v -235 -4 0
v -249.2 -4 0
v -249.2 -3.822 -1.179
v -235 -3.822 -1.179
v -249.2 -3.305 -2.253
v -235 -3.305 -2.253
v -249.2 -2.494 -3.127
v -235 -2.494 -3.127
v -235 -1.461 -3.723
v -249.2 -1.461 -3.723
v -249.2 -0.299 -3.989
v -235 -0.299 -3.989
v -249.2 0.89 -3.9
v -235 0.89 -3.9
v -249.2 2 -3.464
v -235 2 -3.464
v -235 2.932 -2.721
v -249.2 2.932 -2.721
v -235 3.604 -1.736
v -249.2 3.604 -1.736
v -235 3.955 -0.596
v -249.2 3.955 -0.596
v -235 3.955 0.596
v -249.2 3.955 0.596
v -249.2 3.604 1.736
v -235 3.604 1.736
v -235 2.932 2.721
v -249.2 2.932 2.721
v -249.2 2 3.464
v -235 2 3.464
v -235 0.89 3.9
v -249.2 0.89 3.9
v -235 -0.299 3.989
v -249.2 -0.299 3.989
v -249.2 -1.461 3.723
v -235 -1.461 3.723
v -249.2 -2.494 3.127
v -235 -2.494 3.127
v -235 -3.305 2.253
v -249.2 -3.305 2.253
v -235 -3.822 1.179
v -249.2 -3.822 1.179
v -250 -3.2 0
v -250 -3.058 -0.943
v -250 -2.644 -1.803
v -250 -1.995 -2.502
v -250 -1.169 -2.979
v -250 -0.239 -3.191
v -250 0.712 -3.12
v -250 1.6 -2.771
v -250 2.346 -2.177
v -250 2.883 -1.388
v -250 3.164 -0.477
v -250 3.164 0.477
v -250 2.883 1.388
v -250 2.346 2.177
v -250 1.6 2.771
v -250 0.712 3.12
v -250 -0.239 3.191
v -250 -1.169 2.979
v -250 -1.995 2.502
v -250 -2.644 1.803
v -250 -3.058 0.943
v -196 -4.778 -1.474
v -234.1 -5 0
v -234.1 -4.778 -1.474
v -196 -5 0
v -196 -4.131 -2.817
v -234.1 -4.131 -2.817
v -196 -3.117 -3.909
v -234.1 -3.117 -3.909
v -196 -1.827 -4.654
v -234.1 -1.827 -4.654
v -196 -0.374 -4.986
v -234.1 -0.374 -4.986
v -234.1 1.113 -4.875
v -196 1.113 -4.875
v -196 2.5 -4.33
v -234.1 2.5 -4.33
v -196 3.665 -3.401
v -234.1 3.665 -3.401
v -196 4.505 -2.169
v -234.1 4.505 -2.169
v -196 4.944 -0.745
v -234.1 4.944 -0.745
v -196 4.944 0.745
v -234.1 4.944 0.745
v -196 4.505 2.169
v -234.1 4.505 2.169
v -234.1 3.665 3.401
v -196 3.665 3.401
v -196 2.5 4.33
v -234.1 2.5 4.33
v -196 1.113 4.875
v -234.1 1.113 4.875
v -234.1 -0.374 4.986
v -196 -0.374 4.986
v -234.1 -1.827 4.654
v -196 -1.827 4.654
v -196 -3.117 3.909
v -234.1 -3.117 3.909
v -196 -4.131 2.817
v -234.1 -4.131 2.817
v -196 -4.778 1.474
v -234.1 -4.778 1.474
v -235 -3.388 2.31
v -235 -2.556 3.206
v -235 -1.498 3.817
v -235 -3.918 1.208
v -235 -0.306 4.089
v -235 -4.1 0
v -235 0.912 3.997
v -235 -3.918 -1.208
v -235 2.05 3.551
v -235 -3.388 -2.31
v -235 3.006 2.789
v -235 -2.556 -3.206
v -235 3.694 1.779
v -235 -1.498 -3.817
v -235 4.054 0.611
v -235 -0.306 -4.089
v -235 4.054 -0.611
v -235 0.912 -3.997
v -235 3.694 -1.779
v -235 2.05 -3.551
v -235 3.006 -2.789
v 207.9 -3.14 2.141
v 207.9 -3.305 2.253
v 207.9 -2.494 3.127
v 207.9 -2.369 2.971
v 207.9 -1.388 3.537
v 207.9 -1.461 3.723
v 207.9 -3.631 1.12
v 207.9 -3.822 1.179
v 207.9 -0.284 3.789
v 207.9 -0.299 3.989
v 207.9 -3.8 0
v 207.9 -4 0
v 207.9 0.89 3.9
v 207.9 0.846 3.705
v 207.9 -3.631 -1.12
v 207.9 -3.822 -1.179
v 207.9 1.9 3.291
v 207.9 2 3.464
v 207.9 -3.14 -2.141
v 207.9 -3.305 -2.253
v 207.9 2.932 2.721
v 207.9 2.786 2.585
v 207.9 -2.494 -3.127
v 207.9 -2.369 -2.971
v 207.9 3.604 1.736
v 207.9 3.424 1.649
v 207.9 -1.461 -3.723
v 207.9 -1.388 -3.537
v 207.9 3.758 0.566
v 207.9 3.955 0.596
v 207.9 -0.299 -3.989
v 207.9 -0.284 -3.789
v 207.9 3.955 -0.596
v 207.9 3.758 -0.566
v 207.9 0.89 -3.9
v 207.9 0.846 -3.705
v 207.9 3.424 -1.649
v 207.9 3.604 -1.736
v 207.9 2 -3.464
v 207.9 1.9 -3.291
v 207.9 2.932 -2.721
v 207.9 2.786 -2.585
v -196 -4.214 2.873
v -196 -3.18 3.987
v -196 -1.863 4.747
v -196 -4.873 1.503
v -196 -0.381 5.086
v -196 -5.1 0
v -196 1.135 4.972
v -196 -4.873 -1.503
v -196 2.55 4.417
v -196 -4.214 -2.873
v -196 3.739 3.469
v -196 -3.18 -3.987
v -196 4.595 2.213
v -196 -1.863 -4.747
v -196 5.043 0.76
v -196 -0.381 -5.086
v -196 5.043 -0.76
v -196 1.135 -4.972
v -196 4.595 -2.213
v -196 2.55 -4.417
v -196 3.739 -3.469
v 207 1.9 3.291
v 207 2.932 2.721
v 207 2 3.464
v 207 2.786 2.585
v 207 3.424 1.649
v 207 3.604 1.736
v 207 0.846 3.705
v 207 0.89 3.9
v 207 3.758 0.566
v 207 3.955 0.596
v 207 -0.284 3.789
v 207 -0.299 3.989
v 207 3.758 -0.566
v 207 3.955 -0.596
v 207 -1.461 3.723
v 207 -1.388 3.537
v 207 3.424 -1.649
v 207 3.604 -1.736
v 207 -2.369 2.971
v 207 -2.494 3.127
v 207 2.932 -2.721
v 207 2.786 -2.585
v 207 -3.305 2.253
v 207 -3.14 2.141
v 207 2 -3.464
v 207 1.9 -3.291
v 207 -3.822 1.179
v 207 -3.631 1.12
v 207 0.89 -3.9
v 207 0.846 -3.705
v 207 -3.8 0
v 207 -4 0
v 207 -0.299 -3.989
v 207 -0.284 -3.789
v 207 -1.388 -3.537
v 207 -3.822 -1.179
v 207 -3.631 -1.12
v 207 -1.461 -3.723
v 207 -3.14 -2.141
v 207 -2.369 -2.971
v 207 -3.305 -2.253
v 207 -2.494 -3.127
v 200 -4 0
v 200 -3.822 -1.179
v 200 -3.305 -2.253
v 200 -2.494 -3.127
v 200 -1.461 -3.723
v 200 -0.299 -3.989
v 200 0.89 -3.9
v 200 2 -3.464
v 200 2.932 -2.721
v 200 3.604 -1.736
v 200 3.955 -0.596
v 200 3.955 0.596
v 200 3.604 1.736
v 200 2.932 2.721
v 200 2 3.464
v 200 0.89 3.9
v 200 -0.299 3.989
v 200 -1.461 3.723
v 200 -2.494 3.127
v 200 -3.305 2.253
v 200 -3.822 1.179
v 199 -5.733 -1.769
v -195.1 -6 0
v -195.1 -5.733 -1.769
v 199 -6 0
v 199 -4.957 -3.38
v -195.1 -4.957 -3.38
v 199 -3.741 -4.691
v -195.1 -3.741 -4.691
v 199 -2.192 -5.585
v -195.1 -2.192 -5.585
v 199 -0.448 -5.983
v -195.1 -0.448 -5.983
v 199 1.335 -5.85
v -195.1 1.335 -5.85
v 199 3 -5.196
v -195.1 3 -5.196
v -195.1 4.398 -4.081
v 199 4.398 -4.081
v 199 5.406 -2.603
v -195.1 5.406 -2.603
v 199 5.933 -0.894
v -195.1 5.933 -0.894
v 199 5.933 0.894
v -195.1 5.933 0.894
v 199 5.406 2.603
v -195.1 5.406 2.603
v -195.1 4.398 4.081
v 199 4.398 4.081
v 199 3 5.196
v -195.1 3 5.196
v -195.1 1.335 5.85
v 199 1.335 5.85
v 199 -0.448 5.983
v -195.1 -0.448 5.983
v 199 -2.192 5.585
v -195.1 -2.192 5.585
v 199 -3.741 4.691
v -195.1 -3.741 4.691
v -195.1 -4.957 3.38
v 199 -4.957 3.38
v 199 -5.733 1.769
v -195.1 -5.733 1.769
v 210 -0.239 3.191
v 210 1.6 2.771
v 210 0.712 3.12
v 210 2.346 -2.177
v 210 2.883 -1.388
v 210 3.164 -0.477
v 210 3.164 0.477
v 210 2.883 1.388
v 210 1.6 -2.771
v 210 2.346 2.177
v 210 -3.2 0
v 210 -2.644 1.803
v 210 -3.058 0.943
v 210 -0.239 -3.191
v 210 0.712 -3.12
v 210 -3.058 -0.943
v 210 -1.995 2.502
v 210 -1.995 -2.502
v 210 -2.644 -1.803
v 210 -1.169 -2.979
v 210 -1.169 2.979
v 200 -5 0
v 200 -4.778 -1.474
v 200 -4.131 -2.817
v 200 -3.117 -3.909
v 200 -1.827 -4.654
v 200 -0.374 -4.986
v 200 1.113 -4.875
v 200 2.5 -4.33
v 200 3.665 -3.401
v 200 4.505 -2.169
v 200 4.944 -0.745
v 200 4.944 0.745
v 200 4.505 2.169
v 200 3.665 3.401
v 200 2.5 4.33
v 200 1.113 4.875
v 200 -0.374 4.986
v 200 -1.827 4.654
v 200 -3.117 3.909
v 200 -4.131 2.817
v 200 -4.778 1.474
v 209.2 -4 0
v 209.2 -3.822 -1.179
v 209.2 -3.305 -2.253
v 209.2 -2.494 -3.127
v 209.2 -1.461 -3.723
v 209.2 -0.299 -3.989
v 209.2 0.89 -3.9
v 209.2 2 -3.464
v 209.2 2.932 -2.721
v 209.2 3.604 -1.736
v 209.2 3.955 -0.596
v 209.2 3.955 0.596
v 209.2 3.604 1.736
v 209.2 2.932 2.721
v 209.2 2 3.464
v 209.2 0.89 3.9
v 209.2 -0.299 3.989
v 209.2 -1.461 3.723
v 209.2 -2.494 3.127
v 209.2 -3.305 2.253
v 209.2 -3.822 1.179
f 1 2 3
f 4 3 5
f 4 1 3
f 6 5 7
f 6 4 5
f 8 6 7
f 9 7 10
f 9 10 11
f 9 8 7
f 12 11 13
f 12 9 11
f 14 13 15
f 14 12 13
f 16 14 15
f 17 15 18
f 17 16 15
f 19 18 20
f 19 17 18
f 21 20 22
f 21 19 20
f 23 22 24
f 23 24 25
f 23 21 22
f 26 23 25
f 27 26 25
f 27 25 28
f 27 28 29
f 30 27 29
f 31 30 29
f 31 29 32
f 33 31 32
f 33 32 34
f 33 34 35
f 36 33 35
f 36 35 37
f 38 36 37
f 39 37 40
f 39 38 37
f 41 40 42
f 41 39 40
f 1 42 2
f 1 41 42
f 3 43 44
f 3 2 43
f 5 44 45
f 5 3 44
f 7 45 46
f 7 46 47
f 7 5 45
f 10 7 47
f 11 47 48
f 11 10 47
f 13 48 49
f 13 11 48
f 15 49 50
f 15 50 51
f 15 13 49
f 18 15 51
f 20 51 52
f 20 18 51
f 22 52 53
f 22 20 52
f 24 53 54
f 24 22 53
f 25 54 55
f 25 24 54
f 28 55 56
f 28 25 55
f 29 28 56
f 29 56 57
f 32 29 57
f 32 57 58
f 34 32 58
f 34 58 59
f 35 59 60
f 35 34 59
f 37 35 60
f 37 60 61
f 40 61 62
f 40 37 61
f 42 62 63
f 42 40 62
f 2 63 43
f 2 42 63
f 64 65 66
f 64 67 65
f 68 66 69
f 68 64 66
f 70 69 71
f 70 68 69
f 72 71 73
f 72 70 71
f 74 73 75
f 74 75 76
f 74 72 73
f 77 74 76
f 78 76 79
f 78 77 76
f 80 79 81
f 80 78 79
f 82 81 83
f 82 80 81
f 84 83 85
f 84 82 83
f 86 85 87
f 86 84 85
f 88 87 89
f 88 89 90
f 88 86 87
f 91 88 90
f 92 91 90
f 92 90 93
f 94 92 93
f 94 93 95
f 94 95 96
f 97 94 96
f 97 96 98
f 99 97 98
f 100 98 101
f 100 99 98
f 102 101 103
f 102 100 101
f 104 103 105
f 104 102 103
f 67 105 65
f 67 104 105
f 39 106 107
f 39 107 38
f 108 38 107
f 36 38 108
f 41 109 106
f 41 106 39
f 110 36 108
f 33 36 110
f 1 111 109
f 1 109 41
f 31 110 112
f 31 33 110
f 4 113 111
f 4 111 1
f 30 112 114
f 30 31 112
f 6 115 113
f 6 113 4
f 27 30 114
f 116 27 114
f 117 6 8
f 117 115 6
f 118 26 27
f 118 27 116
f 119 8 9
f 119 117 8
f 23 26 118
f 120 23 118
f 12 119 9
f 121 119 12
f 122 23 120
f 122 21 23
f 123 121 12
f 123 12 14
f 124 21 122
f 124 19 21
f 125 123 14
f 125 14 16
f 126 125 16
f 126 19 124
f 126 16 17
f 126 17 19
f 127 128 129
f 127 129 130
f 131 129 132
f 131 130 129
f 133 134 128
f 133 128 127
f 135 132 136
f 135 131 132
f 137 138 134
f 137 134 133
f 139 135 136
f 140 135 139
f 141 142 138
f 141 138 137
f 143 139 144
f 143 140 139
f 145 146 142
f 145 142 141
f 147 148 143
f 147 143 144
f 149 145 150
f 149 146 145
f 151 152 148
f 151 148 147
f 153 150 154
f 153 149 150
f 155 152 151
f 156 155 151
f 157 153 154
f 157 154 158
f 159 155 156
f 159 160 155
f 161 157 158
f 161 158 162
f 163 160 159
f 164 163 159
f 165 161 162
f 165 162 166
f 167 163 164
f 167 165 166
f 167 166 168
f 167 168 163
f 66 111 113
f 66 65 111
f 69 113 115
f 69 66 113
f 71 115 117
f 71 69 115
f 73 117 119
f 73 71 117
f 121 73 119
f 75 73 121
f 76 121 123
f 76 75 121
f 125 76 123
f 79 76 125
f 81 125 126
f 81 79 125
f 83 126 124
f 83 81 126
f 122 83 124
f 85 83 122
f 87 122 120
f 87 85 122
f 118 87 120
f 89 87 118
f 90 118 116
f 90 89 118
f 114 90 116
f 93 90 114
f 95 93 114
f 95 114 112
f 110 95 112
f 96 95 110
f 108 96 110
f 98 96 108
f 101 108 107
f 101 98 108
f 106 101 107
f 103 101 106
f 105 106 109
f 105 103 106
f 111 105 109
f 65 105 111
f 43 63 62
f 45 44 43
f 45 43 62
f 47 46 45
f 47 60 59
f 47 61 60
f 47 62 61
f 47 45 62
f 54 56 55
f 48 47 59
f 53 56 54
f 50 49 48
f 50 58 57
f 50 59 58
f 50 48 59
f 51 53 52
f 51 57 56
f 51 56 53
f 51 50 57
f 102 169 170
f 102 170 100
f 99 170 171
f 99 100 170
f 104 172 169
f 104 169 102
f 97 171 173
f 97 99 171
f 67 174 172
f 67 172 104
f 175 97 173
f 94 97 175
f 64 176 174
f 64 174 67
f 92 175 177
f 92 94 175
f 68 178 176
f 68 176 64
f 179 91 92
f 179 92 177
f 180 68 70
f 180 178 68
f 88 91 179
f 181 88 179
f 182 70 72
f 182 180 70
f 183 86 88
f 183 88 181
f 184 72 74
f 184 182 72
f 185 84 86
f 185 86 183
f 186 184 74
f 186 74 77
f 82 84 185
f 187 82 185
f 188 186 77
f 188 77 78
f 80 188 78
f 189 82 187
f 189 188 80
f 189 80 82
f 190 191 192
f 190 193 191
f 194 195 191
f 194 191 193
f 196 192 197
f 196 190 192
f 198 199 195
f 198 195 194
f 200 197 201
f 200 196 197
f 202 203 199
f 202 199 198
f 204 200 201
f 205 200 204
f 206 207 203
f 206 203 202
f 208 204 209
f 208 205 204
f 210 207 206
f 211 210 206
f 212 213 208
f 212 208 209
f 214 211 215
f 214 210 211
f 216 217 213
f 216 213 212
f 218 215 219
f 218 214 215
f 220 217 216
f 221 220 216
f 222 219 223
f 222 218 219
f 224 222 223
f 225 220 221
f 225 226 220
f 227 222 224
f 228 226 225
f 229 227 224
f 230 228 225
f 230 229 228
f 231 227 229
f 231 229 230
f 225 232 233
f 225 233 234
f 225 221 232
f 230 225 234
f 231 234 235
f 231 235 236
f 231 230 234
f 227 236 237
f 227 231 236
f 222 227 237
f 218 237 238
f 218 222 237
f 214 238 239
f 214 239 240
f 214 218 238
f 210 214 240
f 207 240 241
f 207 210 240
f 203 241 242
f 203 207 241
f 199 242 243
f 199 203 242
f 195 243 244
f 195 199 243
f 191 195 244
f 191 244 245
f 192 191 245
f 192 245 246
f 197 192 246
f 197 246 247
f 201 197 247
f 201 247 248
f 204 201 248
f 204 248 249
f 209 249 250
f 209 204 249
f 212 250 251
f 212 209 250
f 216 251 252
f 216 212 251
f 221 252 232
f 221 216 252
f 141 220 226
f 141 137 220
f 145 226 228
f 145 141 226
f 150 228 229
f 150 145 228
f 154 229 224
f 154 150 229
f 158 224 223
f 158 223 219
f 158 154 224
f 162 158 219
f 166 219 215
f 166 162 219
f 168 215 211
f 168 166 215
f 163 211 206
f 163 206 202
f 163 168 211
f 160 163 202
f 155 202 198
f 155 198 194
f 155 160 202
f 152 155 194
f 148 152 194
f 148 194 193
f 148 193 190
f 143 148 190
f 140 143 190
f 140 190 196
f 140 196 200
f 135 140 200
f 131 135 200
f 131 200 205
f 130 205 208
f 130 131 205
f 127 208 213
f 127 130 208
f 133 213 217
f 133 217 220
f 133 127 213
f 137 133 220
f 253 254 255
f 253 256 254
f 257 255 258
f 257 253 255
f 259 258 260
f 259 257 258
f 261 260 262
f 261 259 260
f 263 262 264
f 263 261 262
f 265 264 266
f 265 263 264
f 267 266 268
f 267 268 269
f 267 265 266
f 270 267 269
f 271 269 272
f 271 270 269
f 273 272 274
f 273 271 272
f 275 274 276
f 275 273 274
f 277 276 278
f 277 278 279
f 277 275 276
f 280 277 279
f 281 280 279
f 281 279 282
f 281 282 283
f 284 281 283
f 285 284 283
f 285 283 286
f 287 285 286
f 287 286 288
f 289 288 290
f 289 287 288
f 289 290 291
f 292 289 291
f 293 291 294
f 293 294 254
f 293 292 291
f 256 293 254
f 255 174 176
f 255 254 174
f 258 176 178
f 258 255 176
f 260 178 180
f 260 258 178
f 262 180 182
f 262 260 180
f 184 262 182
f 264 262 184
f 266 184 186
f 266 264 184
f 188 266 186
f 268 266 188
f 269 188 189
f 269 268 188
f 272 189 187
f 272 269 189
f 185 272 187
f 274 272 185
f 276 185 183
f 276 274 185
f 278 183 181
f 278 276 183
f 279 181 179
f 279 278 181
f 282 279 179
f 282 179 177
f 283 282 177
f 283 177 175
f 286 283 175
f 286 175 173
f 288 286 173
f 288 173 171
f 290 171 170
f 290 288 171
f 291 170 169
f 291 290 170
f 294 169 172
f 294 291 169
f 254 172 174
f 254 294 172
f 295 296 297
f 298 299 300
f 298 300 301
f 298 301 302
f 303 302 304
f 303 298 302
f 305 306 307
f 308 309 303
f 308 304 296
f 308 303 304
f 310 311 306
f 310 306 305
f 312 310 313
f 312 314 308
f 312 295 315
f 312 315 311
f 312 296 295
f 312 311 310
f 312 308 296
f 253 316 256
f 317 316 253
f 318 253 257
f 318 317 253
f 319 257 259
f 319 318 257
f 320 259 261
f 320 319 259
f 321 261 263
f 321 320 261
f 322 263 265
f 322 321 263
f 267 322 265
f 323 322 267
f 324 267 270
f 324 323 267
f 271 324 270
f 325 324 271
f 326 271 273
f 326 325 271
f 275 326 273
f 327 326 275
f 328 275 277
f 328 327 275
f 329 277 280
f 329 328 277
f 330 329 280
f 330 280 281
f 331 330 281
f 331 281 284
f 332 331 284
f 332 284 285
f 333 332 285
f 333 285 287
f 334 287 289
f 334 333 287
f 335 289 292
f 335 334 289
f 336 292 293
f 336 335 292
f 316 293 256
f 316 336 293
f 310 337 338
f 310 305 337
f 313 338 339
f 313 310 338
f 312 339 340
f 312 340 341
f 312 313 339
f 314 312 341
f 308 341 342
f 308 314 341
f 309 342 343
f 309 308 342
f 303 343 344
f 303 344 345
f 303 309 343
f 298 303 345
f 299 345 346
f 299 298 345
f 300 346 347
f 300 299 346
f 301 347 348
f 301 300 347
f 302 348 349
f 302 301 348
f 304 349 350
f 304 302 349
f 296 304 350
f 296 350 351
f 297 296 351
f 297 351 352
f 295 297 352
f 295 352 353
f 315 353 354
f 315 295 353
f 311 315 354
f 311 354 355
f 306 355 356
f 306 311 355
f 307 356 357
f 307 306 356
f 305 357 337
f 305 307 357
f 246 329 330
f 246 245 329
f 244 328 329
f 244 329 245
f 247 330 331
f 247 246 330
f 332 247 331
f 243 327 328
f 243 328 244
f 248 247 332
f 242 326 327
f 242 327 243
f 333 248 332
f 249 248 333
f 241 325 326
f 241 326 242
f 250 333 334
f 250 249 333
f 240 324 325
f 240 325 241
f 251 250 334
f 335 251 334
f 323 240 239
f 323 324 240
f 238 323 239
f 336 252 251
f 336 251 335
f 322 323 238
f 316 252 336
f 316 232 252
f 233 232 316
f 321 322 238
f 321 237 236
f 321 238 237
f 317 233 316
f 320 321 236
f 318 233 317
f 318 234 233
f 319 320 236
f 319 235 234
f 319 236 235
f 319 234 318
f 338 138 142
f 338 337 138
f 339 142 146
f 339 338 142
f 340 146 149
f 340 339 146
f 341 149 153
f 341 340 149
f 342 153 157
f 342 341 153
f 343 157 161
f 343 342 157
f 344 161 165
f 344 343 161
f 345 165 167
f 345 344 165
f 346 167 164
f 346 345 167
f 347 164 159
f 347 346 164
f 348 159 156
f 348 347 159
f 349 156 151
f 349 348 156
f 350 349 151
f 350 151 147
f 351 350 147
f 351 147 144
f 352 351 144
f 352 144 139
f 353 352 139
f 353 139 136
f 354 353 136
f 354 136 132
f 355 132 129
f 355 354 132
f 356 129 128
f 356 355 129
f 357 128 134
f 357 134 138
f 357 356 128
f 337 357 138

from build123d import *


with BuildPart() as part:
    # Esquisse1 → Révolution1 (revolve)
    with BuildSketch(Plane.XY, mode=Mode.PRIVATE) as r_volution1_sk:
        Polygon((-250, 0), (-250, 3.2), (-249.2, 4), (-235, 4), (-235, 4.1), (-234.1, 5), (-196, 5), (-196, 5.1), (-195.1, 6), (199, 6), (200, 5), (200, 4), (207, 4), (207, 3.8), (207.9, 3.8), (207.9, 4), (209.2, 4), (210, 3.2), (210, 0), align=None)
    revolve(r_volution1_sk.sketch.rotate(Axis((-511.970894611, 0, 0), (1, 0, 0)), 180), axis=Axis((-511.970894611, 0, 0), (1, 0, 0)))


solid = part.part
